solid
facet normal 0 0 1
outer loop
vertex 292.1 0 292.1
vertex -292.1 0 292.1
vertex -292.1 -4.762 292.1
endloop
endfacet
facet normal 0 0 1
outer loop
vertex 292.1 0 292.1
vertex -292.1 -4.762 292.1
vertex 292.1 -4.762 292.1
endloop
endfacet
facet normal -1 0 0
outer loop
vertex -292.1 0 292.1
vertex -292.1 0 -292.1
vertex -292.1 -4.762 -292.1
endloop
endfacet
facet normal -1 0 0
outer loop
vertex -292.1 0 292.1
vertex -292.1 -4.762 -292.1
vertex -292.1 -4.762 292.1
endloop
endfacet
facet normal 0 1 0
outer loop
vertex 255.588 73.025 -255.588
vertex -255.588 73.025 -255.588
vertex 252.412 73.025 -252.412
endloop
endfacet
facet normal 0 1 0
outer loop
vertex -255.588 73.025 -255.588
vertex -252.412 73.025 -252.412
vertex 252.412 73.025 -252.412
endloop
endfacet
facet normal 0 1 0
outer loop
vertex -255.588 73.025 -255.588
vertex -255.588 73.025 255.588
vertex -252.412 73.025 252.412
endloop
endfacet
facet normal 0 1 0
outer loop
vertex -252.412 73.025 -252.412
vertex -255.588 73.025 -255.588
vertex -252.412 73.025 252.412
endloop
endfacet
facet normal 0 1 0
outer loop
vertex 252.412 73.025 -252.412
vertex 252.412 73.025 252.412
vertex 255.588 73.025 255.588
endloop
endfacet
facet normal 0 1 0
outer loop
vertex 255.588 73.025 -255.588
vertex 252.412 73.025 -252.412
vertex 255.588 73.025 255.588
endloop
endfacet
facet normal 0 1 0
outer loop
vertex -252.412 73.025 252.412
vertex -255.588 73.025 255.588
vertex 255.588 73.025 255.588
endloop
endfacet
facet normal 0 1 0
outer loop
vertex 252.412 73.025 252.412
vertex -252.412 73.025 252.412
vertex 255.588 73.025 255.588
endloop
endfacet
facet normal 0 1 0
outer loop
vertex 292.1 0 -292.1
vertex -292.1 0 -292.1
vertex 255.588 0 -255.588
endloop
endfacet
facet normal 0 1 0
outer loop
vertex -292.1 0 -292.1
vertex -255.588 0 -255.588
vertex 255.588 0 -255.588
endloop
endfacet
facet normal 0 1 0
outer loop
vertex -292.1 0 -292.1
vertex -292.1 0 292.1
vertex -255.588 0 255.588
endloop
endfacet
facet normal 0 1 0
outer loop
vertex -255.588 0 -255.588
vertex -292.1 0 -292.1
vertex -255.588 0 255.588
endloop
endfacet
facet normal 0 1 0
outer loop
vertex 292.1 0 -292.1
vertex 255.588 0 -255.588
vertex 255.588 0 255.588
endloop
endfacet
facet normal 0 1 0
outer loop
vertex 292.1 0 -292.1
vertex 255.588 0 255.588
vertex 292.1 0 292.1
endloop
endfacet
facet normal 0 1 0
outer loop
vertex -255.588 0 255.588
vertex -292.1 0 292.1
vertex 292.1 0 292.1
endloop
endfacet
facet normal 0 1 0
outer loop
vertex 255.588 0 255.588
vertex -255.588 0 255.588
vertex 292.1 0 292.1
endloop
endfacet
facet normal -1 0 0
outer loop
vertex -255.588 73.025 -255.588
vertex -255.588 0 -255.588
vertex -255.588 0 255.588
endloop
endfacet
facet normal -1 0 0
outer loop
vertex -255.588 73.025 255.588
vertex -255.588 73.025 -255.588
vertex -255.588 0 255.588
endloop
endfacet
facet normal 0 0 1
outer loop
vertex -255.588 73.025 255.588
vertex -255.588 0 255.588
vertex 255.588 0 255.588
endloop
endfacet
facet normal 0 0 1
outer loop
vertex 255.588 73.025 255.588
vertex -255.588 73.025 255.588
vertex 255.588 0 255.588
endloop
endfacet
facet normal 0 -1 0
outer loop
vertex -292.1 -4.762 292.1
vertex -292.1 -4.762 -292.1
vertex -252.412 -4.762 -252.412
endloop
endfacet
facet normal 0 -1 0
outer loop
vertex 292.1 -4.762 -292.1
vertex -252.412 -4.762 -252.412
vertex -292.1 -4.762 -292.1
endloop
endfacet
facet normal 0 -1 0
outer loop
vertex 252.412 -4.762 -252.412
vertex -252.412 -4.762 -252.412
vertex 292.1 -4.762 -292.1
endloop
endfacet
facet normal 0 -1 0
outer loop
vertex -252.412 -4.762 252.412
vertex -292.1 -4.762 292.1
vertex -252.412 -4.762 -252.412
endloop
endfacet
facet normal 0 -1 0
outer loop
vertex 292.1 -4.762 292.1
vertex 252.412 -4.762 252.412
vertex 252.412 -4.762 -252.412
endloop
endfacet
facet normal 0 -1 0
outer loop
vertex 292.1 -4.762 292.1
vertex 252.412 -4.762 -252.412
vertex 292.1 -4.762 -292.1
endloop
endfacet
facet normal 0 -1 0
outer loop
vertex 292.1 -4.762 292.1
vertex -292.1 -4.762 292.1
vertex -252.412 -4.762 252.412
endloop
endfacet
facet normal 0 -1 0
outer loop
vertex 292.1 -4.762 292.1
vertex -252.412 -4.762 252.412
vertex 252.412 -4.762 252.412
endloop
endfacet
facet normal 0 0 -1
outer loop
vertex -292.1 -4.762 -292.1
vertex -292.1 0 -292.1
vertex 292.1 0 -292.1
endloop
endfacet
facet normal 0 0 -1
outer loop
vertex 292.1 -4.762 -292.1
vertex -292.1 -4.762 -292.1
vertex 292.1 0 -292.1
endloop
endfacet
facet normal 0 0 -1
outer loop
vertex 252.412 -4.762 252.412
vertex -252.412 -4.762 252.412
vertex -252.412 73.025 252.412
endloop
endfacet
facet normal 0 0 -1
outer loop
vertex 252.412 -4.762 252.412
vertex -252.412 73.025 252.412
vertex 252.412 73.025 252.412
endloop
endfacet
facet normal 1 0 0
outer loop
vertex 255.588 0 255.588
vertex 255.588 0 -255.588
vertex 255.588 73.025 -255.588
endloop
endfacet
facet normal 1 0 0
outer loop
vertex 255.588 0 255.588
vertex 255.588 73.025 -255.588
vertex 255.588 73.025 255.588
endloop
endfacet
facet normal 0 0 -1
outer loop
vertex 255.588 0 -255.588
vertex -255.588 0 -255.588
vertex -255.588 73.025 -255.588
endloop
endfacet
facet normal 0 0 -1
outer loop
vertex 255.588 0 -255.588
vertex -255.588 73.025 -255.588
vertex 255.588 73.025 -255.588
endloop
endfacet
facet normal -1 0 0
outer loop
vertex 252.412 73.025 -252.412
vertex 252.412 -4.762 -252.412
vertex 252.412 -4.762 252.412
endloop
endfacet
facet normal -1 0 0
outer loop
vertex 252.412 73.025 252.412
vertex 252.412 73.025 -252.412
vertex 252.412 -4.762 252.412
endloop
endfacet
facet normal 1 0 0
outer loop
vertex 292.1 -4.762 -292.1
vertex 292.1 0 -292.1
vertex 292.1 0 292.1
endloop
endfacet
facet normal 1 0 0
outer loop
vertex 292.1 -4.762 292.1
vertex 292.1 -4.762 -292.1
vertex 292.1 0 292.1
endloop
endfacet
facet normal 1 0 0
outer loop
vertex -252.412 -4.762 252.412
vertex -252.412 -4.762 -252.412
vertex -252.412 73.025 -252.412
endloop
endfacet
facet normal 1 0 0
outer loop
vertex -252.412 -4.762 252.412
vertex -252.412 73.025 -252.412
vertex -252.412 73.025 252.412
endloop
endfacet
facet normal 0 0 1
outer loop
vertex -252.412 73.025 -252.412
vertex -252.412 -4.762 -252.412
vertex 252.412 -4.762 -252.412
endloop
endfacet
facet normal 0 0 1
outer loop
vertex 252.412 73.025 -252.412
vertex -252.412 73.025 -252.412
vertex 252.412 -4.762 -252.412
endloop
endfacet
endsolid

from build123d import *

# Parameters (mm, degrees)
F0_W     = 511.175
F0_H     = 511.175
F1_DEPTH = 73.025
F2_W     = 584.2
F2_H     = 584.2
F2_W_2   = 511.175
F2_H_2   = 511.175
F3_DEPTH = 4.7625
F4_W     = 504.825
F4_H     = 504.825
F5_DEPTH = 77.7885


with BuildPart() as f1:
    # F0 (on Front) → F1 (new body)
    with BuildSketch(Plane.XZ):
        Rectangle(F0_W, F0_H)
    extrude(amount=-F1_DEPTH)

    # F2 (on face) → F3 (join)
    with BuildSketch(Plane.XZ):
        Rectangle(F2_W, F2_H)
        Rectangle(F2_W_2, F2_H_2, mode=Mode.SUBTRACT)
        Rectangle(F2_W_2, F2_H_2)
    extrude(amount=F3_DEPTH)

    # F4 (on face) → F5 (cut, through all)
    with BuildSketch(Plane.XZ.offset(4.7625)):
        Rectangle(F4_W, F4_H)
    extrude(amount=-F5_DEPTH, mode=Mode.SUBTRACT)


solid = f1.part
